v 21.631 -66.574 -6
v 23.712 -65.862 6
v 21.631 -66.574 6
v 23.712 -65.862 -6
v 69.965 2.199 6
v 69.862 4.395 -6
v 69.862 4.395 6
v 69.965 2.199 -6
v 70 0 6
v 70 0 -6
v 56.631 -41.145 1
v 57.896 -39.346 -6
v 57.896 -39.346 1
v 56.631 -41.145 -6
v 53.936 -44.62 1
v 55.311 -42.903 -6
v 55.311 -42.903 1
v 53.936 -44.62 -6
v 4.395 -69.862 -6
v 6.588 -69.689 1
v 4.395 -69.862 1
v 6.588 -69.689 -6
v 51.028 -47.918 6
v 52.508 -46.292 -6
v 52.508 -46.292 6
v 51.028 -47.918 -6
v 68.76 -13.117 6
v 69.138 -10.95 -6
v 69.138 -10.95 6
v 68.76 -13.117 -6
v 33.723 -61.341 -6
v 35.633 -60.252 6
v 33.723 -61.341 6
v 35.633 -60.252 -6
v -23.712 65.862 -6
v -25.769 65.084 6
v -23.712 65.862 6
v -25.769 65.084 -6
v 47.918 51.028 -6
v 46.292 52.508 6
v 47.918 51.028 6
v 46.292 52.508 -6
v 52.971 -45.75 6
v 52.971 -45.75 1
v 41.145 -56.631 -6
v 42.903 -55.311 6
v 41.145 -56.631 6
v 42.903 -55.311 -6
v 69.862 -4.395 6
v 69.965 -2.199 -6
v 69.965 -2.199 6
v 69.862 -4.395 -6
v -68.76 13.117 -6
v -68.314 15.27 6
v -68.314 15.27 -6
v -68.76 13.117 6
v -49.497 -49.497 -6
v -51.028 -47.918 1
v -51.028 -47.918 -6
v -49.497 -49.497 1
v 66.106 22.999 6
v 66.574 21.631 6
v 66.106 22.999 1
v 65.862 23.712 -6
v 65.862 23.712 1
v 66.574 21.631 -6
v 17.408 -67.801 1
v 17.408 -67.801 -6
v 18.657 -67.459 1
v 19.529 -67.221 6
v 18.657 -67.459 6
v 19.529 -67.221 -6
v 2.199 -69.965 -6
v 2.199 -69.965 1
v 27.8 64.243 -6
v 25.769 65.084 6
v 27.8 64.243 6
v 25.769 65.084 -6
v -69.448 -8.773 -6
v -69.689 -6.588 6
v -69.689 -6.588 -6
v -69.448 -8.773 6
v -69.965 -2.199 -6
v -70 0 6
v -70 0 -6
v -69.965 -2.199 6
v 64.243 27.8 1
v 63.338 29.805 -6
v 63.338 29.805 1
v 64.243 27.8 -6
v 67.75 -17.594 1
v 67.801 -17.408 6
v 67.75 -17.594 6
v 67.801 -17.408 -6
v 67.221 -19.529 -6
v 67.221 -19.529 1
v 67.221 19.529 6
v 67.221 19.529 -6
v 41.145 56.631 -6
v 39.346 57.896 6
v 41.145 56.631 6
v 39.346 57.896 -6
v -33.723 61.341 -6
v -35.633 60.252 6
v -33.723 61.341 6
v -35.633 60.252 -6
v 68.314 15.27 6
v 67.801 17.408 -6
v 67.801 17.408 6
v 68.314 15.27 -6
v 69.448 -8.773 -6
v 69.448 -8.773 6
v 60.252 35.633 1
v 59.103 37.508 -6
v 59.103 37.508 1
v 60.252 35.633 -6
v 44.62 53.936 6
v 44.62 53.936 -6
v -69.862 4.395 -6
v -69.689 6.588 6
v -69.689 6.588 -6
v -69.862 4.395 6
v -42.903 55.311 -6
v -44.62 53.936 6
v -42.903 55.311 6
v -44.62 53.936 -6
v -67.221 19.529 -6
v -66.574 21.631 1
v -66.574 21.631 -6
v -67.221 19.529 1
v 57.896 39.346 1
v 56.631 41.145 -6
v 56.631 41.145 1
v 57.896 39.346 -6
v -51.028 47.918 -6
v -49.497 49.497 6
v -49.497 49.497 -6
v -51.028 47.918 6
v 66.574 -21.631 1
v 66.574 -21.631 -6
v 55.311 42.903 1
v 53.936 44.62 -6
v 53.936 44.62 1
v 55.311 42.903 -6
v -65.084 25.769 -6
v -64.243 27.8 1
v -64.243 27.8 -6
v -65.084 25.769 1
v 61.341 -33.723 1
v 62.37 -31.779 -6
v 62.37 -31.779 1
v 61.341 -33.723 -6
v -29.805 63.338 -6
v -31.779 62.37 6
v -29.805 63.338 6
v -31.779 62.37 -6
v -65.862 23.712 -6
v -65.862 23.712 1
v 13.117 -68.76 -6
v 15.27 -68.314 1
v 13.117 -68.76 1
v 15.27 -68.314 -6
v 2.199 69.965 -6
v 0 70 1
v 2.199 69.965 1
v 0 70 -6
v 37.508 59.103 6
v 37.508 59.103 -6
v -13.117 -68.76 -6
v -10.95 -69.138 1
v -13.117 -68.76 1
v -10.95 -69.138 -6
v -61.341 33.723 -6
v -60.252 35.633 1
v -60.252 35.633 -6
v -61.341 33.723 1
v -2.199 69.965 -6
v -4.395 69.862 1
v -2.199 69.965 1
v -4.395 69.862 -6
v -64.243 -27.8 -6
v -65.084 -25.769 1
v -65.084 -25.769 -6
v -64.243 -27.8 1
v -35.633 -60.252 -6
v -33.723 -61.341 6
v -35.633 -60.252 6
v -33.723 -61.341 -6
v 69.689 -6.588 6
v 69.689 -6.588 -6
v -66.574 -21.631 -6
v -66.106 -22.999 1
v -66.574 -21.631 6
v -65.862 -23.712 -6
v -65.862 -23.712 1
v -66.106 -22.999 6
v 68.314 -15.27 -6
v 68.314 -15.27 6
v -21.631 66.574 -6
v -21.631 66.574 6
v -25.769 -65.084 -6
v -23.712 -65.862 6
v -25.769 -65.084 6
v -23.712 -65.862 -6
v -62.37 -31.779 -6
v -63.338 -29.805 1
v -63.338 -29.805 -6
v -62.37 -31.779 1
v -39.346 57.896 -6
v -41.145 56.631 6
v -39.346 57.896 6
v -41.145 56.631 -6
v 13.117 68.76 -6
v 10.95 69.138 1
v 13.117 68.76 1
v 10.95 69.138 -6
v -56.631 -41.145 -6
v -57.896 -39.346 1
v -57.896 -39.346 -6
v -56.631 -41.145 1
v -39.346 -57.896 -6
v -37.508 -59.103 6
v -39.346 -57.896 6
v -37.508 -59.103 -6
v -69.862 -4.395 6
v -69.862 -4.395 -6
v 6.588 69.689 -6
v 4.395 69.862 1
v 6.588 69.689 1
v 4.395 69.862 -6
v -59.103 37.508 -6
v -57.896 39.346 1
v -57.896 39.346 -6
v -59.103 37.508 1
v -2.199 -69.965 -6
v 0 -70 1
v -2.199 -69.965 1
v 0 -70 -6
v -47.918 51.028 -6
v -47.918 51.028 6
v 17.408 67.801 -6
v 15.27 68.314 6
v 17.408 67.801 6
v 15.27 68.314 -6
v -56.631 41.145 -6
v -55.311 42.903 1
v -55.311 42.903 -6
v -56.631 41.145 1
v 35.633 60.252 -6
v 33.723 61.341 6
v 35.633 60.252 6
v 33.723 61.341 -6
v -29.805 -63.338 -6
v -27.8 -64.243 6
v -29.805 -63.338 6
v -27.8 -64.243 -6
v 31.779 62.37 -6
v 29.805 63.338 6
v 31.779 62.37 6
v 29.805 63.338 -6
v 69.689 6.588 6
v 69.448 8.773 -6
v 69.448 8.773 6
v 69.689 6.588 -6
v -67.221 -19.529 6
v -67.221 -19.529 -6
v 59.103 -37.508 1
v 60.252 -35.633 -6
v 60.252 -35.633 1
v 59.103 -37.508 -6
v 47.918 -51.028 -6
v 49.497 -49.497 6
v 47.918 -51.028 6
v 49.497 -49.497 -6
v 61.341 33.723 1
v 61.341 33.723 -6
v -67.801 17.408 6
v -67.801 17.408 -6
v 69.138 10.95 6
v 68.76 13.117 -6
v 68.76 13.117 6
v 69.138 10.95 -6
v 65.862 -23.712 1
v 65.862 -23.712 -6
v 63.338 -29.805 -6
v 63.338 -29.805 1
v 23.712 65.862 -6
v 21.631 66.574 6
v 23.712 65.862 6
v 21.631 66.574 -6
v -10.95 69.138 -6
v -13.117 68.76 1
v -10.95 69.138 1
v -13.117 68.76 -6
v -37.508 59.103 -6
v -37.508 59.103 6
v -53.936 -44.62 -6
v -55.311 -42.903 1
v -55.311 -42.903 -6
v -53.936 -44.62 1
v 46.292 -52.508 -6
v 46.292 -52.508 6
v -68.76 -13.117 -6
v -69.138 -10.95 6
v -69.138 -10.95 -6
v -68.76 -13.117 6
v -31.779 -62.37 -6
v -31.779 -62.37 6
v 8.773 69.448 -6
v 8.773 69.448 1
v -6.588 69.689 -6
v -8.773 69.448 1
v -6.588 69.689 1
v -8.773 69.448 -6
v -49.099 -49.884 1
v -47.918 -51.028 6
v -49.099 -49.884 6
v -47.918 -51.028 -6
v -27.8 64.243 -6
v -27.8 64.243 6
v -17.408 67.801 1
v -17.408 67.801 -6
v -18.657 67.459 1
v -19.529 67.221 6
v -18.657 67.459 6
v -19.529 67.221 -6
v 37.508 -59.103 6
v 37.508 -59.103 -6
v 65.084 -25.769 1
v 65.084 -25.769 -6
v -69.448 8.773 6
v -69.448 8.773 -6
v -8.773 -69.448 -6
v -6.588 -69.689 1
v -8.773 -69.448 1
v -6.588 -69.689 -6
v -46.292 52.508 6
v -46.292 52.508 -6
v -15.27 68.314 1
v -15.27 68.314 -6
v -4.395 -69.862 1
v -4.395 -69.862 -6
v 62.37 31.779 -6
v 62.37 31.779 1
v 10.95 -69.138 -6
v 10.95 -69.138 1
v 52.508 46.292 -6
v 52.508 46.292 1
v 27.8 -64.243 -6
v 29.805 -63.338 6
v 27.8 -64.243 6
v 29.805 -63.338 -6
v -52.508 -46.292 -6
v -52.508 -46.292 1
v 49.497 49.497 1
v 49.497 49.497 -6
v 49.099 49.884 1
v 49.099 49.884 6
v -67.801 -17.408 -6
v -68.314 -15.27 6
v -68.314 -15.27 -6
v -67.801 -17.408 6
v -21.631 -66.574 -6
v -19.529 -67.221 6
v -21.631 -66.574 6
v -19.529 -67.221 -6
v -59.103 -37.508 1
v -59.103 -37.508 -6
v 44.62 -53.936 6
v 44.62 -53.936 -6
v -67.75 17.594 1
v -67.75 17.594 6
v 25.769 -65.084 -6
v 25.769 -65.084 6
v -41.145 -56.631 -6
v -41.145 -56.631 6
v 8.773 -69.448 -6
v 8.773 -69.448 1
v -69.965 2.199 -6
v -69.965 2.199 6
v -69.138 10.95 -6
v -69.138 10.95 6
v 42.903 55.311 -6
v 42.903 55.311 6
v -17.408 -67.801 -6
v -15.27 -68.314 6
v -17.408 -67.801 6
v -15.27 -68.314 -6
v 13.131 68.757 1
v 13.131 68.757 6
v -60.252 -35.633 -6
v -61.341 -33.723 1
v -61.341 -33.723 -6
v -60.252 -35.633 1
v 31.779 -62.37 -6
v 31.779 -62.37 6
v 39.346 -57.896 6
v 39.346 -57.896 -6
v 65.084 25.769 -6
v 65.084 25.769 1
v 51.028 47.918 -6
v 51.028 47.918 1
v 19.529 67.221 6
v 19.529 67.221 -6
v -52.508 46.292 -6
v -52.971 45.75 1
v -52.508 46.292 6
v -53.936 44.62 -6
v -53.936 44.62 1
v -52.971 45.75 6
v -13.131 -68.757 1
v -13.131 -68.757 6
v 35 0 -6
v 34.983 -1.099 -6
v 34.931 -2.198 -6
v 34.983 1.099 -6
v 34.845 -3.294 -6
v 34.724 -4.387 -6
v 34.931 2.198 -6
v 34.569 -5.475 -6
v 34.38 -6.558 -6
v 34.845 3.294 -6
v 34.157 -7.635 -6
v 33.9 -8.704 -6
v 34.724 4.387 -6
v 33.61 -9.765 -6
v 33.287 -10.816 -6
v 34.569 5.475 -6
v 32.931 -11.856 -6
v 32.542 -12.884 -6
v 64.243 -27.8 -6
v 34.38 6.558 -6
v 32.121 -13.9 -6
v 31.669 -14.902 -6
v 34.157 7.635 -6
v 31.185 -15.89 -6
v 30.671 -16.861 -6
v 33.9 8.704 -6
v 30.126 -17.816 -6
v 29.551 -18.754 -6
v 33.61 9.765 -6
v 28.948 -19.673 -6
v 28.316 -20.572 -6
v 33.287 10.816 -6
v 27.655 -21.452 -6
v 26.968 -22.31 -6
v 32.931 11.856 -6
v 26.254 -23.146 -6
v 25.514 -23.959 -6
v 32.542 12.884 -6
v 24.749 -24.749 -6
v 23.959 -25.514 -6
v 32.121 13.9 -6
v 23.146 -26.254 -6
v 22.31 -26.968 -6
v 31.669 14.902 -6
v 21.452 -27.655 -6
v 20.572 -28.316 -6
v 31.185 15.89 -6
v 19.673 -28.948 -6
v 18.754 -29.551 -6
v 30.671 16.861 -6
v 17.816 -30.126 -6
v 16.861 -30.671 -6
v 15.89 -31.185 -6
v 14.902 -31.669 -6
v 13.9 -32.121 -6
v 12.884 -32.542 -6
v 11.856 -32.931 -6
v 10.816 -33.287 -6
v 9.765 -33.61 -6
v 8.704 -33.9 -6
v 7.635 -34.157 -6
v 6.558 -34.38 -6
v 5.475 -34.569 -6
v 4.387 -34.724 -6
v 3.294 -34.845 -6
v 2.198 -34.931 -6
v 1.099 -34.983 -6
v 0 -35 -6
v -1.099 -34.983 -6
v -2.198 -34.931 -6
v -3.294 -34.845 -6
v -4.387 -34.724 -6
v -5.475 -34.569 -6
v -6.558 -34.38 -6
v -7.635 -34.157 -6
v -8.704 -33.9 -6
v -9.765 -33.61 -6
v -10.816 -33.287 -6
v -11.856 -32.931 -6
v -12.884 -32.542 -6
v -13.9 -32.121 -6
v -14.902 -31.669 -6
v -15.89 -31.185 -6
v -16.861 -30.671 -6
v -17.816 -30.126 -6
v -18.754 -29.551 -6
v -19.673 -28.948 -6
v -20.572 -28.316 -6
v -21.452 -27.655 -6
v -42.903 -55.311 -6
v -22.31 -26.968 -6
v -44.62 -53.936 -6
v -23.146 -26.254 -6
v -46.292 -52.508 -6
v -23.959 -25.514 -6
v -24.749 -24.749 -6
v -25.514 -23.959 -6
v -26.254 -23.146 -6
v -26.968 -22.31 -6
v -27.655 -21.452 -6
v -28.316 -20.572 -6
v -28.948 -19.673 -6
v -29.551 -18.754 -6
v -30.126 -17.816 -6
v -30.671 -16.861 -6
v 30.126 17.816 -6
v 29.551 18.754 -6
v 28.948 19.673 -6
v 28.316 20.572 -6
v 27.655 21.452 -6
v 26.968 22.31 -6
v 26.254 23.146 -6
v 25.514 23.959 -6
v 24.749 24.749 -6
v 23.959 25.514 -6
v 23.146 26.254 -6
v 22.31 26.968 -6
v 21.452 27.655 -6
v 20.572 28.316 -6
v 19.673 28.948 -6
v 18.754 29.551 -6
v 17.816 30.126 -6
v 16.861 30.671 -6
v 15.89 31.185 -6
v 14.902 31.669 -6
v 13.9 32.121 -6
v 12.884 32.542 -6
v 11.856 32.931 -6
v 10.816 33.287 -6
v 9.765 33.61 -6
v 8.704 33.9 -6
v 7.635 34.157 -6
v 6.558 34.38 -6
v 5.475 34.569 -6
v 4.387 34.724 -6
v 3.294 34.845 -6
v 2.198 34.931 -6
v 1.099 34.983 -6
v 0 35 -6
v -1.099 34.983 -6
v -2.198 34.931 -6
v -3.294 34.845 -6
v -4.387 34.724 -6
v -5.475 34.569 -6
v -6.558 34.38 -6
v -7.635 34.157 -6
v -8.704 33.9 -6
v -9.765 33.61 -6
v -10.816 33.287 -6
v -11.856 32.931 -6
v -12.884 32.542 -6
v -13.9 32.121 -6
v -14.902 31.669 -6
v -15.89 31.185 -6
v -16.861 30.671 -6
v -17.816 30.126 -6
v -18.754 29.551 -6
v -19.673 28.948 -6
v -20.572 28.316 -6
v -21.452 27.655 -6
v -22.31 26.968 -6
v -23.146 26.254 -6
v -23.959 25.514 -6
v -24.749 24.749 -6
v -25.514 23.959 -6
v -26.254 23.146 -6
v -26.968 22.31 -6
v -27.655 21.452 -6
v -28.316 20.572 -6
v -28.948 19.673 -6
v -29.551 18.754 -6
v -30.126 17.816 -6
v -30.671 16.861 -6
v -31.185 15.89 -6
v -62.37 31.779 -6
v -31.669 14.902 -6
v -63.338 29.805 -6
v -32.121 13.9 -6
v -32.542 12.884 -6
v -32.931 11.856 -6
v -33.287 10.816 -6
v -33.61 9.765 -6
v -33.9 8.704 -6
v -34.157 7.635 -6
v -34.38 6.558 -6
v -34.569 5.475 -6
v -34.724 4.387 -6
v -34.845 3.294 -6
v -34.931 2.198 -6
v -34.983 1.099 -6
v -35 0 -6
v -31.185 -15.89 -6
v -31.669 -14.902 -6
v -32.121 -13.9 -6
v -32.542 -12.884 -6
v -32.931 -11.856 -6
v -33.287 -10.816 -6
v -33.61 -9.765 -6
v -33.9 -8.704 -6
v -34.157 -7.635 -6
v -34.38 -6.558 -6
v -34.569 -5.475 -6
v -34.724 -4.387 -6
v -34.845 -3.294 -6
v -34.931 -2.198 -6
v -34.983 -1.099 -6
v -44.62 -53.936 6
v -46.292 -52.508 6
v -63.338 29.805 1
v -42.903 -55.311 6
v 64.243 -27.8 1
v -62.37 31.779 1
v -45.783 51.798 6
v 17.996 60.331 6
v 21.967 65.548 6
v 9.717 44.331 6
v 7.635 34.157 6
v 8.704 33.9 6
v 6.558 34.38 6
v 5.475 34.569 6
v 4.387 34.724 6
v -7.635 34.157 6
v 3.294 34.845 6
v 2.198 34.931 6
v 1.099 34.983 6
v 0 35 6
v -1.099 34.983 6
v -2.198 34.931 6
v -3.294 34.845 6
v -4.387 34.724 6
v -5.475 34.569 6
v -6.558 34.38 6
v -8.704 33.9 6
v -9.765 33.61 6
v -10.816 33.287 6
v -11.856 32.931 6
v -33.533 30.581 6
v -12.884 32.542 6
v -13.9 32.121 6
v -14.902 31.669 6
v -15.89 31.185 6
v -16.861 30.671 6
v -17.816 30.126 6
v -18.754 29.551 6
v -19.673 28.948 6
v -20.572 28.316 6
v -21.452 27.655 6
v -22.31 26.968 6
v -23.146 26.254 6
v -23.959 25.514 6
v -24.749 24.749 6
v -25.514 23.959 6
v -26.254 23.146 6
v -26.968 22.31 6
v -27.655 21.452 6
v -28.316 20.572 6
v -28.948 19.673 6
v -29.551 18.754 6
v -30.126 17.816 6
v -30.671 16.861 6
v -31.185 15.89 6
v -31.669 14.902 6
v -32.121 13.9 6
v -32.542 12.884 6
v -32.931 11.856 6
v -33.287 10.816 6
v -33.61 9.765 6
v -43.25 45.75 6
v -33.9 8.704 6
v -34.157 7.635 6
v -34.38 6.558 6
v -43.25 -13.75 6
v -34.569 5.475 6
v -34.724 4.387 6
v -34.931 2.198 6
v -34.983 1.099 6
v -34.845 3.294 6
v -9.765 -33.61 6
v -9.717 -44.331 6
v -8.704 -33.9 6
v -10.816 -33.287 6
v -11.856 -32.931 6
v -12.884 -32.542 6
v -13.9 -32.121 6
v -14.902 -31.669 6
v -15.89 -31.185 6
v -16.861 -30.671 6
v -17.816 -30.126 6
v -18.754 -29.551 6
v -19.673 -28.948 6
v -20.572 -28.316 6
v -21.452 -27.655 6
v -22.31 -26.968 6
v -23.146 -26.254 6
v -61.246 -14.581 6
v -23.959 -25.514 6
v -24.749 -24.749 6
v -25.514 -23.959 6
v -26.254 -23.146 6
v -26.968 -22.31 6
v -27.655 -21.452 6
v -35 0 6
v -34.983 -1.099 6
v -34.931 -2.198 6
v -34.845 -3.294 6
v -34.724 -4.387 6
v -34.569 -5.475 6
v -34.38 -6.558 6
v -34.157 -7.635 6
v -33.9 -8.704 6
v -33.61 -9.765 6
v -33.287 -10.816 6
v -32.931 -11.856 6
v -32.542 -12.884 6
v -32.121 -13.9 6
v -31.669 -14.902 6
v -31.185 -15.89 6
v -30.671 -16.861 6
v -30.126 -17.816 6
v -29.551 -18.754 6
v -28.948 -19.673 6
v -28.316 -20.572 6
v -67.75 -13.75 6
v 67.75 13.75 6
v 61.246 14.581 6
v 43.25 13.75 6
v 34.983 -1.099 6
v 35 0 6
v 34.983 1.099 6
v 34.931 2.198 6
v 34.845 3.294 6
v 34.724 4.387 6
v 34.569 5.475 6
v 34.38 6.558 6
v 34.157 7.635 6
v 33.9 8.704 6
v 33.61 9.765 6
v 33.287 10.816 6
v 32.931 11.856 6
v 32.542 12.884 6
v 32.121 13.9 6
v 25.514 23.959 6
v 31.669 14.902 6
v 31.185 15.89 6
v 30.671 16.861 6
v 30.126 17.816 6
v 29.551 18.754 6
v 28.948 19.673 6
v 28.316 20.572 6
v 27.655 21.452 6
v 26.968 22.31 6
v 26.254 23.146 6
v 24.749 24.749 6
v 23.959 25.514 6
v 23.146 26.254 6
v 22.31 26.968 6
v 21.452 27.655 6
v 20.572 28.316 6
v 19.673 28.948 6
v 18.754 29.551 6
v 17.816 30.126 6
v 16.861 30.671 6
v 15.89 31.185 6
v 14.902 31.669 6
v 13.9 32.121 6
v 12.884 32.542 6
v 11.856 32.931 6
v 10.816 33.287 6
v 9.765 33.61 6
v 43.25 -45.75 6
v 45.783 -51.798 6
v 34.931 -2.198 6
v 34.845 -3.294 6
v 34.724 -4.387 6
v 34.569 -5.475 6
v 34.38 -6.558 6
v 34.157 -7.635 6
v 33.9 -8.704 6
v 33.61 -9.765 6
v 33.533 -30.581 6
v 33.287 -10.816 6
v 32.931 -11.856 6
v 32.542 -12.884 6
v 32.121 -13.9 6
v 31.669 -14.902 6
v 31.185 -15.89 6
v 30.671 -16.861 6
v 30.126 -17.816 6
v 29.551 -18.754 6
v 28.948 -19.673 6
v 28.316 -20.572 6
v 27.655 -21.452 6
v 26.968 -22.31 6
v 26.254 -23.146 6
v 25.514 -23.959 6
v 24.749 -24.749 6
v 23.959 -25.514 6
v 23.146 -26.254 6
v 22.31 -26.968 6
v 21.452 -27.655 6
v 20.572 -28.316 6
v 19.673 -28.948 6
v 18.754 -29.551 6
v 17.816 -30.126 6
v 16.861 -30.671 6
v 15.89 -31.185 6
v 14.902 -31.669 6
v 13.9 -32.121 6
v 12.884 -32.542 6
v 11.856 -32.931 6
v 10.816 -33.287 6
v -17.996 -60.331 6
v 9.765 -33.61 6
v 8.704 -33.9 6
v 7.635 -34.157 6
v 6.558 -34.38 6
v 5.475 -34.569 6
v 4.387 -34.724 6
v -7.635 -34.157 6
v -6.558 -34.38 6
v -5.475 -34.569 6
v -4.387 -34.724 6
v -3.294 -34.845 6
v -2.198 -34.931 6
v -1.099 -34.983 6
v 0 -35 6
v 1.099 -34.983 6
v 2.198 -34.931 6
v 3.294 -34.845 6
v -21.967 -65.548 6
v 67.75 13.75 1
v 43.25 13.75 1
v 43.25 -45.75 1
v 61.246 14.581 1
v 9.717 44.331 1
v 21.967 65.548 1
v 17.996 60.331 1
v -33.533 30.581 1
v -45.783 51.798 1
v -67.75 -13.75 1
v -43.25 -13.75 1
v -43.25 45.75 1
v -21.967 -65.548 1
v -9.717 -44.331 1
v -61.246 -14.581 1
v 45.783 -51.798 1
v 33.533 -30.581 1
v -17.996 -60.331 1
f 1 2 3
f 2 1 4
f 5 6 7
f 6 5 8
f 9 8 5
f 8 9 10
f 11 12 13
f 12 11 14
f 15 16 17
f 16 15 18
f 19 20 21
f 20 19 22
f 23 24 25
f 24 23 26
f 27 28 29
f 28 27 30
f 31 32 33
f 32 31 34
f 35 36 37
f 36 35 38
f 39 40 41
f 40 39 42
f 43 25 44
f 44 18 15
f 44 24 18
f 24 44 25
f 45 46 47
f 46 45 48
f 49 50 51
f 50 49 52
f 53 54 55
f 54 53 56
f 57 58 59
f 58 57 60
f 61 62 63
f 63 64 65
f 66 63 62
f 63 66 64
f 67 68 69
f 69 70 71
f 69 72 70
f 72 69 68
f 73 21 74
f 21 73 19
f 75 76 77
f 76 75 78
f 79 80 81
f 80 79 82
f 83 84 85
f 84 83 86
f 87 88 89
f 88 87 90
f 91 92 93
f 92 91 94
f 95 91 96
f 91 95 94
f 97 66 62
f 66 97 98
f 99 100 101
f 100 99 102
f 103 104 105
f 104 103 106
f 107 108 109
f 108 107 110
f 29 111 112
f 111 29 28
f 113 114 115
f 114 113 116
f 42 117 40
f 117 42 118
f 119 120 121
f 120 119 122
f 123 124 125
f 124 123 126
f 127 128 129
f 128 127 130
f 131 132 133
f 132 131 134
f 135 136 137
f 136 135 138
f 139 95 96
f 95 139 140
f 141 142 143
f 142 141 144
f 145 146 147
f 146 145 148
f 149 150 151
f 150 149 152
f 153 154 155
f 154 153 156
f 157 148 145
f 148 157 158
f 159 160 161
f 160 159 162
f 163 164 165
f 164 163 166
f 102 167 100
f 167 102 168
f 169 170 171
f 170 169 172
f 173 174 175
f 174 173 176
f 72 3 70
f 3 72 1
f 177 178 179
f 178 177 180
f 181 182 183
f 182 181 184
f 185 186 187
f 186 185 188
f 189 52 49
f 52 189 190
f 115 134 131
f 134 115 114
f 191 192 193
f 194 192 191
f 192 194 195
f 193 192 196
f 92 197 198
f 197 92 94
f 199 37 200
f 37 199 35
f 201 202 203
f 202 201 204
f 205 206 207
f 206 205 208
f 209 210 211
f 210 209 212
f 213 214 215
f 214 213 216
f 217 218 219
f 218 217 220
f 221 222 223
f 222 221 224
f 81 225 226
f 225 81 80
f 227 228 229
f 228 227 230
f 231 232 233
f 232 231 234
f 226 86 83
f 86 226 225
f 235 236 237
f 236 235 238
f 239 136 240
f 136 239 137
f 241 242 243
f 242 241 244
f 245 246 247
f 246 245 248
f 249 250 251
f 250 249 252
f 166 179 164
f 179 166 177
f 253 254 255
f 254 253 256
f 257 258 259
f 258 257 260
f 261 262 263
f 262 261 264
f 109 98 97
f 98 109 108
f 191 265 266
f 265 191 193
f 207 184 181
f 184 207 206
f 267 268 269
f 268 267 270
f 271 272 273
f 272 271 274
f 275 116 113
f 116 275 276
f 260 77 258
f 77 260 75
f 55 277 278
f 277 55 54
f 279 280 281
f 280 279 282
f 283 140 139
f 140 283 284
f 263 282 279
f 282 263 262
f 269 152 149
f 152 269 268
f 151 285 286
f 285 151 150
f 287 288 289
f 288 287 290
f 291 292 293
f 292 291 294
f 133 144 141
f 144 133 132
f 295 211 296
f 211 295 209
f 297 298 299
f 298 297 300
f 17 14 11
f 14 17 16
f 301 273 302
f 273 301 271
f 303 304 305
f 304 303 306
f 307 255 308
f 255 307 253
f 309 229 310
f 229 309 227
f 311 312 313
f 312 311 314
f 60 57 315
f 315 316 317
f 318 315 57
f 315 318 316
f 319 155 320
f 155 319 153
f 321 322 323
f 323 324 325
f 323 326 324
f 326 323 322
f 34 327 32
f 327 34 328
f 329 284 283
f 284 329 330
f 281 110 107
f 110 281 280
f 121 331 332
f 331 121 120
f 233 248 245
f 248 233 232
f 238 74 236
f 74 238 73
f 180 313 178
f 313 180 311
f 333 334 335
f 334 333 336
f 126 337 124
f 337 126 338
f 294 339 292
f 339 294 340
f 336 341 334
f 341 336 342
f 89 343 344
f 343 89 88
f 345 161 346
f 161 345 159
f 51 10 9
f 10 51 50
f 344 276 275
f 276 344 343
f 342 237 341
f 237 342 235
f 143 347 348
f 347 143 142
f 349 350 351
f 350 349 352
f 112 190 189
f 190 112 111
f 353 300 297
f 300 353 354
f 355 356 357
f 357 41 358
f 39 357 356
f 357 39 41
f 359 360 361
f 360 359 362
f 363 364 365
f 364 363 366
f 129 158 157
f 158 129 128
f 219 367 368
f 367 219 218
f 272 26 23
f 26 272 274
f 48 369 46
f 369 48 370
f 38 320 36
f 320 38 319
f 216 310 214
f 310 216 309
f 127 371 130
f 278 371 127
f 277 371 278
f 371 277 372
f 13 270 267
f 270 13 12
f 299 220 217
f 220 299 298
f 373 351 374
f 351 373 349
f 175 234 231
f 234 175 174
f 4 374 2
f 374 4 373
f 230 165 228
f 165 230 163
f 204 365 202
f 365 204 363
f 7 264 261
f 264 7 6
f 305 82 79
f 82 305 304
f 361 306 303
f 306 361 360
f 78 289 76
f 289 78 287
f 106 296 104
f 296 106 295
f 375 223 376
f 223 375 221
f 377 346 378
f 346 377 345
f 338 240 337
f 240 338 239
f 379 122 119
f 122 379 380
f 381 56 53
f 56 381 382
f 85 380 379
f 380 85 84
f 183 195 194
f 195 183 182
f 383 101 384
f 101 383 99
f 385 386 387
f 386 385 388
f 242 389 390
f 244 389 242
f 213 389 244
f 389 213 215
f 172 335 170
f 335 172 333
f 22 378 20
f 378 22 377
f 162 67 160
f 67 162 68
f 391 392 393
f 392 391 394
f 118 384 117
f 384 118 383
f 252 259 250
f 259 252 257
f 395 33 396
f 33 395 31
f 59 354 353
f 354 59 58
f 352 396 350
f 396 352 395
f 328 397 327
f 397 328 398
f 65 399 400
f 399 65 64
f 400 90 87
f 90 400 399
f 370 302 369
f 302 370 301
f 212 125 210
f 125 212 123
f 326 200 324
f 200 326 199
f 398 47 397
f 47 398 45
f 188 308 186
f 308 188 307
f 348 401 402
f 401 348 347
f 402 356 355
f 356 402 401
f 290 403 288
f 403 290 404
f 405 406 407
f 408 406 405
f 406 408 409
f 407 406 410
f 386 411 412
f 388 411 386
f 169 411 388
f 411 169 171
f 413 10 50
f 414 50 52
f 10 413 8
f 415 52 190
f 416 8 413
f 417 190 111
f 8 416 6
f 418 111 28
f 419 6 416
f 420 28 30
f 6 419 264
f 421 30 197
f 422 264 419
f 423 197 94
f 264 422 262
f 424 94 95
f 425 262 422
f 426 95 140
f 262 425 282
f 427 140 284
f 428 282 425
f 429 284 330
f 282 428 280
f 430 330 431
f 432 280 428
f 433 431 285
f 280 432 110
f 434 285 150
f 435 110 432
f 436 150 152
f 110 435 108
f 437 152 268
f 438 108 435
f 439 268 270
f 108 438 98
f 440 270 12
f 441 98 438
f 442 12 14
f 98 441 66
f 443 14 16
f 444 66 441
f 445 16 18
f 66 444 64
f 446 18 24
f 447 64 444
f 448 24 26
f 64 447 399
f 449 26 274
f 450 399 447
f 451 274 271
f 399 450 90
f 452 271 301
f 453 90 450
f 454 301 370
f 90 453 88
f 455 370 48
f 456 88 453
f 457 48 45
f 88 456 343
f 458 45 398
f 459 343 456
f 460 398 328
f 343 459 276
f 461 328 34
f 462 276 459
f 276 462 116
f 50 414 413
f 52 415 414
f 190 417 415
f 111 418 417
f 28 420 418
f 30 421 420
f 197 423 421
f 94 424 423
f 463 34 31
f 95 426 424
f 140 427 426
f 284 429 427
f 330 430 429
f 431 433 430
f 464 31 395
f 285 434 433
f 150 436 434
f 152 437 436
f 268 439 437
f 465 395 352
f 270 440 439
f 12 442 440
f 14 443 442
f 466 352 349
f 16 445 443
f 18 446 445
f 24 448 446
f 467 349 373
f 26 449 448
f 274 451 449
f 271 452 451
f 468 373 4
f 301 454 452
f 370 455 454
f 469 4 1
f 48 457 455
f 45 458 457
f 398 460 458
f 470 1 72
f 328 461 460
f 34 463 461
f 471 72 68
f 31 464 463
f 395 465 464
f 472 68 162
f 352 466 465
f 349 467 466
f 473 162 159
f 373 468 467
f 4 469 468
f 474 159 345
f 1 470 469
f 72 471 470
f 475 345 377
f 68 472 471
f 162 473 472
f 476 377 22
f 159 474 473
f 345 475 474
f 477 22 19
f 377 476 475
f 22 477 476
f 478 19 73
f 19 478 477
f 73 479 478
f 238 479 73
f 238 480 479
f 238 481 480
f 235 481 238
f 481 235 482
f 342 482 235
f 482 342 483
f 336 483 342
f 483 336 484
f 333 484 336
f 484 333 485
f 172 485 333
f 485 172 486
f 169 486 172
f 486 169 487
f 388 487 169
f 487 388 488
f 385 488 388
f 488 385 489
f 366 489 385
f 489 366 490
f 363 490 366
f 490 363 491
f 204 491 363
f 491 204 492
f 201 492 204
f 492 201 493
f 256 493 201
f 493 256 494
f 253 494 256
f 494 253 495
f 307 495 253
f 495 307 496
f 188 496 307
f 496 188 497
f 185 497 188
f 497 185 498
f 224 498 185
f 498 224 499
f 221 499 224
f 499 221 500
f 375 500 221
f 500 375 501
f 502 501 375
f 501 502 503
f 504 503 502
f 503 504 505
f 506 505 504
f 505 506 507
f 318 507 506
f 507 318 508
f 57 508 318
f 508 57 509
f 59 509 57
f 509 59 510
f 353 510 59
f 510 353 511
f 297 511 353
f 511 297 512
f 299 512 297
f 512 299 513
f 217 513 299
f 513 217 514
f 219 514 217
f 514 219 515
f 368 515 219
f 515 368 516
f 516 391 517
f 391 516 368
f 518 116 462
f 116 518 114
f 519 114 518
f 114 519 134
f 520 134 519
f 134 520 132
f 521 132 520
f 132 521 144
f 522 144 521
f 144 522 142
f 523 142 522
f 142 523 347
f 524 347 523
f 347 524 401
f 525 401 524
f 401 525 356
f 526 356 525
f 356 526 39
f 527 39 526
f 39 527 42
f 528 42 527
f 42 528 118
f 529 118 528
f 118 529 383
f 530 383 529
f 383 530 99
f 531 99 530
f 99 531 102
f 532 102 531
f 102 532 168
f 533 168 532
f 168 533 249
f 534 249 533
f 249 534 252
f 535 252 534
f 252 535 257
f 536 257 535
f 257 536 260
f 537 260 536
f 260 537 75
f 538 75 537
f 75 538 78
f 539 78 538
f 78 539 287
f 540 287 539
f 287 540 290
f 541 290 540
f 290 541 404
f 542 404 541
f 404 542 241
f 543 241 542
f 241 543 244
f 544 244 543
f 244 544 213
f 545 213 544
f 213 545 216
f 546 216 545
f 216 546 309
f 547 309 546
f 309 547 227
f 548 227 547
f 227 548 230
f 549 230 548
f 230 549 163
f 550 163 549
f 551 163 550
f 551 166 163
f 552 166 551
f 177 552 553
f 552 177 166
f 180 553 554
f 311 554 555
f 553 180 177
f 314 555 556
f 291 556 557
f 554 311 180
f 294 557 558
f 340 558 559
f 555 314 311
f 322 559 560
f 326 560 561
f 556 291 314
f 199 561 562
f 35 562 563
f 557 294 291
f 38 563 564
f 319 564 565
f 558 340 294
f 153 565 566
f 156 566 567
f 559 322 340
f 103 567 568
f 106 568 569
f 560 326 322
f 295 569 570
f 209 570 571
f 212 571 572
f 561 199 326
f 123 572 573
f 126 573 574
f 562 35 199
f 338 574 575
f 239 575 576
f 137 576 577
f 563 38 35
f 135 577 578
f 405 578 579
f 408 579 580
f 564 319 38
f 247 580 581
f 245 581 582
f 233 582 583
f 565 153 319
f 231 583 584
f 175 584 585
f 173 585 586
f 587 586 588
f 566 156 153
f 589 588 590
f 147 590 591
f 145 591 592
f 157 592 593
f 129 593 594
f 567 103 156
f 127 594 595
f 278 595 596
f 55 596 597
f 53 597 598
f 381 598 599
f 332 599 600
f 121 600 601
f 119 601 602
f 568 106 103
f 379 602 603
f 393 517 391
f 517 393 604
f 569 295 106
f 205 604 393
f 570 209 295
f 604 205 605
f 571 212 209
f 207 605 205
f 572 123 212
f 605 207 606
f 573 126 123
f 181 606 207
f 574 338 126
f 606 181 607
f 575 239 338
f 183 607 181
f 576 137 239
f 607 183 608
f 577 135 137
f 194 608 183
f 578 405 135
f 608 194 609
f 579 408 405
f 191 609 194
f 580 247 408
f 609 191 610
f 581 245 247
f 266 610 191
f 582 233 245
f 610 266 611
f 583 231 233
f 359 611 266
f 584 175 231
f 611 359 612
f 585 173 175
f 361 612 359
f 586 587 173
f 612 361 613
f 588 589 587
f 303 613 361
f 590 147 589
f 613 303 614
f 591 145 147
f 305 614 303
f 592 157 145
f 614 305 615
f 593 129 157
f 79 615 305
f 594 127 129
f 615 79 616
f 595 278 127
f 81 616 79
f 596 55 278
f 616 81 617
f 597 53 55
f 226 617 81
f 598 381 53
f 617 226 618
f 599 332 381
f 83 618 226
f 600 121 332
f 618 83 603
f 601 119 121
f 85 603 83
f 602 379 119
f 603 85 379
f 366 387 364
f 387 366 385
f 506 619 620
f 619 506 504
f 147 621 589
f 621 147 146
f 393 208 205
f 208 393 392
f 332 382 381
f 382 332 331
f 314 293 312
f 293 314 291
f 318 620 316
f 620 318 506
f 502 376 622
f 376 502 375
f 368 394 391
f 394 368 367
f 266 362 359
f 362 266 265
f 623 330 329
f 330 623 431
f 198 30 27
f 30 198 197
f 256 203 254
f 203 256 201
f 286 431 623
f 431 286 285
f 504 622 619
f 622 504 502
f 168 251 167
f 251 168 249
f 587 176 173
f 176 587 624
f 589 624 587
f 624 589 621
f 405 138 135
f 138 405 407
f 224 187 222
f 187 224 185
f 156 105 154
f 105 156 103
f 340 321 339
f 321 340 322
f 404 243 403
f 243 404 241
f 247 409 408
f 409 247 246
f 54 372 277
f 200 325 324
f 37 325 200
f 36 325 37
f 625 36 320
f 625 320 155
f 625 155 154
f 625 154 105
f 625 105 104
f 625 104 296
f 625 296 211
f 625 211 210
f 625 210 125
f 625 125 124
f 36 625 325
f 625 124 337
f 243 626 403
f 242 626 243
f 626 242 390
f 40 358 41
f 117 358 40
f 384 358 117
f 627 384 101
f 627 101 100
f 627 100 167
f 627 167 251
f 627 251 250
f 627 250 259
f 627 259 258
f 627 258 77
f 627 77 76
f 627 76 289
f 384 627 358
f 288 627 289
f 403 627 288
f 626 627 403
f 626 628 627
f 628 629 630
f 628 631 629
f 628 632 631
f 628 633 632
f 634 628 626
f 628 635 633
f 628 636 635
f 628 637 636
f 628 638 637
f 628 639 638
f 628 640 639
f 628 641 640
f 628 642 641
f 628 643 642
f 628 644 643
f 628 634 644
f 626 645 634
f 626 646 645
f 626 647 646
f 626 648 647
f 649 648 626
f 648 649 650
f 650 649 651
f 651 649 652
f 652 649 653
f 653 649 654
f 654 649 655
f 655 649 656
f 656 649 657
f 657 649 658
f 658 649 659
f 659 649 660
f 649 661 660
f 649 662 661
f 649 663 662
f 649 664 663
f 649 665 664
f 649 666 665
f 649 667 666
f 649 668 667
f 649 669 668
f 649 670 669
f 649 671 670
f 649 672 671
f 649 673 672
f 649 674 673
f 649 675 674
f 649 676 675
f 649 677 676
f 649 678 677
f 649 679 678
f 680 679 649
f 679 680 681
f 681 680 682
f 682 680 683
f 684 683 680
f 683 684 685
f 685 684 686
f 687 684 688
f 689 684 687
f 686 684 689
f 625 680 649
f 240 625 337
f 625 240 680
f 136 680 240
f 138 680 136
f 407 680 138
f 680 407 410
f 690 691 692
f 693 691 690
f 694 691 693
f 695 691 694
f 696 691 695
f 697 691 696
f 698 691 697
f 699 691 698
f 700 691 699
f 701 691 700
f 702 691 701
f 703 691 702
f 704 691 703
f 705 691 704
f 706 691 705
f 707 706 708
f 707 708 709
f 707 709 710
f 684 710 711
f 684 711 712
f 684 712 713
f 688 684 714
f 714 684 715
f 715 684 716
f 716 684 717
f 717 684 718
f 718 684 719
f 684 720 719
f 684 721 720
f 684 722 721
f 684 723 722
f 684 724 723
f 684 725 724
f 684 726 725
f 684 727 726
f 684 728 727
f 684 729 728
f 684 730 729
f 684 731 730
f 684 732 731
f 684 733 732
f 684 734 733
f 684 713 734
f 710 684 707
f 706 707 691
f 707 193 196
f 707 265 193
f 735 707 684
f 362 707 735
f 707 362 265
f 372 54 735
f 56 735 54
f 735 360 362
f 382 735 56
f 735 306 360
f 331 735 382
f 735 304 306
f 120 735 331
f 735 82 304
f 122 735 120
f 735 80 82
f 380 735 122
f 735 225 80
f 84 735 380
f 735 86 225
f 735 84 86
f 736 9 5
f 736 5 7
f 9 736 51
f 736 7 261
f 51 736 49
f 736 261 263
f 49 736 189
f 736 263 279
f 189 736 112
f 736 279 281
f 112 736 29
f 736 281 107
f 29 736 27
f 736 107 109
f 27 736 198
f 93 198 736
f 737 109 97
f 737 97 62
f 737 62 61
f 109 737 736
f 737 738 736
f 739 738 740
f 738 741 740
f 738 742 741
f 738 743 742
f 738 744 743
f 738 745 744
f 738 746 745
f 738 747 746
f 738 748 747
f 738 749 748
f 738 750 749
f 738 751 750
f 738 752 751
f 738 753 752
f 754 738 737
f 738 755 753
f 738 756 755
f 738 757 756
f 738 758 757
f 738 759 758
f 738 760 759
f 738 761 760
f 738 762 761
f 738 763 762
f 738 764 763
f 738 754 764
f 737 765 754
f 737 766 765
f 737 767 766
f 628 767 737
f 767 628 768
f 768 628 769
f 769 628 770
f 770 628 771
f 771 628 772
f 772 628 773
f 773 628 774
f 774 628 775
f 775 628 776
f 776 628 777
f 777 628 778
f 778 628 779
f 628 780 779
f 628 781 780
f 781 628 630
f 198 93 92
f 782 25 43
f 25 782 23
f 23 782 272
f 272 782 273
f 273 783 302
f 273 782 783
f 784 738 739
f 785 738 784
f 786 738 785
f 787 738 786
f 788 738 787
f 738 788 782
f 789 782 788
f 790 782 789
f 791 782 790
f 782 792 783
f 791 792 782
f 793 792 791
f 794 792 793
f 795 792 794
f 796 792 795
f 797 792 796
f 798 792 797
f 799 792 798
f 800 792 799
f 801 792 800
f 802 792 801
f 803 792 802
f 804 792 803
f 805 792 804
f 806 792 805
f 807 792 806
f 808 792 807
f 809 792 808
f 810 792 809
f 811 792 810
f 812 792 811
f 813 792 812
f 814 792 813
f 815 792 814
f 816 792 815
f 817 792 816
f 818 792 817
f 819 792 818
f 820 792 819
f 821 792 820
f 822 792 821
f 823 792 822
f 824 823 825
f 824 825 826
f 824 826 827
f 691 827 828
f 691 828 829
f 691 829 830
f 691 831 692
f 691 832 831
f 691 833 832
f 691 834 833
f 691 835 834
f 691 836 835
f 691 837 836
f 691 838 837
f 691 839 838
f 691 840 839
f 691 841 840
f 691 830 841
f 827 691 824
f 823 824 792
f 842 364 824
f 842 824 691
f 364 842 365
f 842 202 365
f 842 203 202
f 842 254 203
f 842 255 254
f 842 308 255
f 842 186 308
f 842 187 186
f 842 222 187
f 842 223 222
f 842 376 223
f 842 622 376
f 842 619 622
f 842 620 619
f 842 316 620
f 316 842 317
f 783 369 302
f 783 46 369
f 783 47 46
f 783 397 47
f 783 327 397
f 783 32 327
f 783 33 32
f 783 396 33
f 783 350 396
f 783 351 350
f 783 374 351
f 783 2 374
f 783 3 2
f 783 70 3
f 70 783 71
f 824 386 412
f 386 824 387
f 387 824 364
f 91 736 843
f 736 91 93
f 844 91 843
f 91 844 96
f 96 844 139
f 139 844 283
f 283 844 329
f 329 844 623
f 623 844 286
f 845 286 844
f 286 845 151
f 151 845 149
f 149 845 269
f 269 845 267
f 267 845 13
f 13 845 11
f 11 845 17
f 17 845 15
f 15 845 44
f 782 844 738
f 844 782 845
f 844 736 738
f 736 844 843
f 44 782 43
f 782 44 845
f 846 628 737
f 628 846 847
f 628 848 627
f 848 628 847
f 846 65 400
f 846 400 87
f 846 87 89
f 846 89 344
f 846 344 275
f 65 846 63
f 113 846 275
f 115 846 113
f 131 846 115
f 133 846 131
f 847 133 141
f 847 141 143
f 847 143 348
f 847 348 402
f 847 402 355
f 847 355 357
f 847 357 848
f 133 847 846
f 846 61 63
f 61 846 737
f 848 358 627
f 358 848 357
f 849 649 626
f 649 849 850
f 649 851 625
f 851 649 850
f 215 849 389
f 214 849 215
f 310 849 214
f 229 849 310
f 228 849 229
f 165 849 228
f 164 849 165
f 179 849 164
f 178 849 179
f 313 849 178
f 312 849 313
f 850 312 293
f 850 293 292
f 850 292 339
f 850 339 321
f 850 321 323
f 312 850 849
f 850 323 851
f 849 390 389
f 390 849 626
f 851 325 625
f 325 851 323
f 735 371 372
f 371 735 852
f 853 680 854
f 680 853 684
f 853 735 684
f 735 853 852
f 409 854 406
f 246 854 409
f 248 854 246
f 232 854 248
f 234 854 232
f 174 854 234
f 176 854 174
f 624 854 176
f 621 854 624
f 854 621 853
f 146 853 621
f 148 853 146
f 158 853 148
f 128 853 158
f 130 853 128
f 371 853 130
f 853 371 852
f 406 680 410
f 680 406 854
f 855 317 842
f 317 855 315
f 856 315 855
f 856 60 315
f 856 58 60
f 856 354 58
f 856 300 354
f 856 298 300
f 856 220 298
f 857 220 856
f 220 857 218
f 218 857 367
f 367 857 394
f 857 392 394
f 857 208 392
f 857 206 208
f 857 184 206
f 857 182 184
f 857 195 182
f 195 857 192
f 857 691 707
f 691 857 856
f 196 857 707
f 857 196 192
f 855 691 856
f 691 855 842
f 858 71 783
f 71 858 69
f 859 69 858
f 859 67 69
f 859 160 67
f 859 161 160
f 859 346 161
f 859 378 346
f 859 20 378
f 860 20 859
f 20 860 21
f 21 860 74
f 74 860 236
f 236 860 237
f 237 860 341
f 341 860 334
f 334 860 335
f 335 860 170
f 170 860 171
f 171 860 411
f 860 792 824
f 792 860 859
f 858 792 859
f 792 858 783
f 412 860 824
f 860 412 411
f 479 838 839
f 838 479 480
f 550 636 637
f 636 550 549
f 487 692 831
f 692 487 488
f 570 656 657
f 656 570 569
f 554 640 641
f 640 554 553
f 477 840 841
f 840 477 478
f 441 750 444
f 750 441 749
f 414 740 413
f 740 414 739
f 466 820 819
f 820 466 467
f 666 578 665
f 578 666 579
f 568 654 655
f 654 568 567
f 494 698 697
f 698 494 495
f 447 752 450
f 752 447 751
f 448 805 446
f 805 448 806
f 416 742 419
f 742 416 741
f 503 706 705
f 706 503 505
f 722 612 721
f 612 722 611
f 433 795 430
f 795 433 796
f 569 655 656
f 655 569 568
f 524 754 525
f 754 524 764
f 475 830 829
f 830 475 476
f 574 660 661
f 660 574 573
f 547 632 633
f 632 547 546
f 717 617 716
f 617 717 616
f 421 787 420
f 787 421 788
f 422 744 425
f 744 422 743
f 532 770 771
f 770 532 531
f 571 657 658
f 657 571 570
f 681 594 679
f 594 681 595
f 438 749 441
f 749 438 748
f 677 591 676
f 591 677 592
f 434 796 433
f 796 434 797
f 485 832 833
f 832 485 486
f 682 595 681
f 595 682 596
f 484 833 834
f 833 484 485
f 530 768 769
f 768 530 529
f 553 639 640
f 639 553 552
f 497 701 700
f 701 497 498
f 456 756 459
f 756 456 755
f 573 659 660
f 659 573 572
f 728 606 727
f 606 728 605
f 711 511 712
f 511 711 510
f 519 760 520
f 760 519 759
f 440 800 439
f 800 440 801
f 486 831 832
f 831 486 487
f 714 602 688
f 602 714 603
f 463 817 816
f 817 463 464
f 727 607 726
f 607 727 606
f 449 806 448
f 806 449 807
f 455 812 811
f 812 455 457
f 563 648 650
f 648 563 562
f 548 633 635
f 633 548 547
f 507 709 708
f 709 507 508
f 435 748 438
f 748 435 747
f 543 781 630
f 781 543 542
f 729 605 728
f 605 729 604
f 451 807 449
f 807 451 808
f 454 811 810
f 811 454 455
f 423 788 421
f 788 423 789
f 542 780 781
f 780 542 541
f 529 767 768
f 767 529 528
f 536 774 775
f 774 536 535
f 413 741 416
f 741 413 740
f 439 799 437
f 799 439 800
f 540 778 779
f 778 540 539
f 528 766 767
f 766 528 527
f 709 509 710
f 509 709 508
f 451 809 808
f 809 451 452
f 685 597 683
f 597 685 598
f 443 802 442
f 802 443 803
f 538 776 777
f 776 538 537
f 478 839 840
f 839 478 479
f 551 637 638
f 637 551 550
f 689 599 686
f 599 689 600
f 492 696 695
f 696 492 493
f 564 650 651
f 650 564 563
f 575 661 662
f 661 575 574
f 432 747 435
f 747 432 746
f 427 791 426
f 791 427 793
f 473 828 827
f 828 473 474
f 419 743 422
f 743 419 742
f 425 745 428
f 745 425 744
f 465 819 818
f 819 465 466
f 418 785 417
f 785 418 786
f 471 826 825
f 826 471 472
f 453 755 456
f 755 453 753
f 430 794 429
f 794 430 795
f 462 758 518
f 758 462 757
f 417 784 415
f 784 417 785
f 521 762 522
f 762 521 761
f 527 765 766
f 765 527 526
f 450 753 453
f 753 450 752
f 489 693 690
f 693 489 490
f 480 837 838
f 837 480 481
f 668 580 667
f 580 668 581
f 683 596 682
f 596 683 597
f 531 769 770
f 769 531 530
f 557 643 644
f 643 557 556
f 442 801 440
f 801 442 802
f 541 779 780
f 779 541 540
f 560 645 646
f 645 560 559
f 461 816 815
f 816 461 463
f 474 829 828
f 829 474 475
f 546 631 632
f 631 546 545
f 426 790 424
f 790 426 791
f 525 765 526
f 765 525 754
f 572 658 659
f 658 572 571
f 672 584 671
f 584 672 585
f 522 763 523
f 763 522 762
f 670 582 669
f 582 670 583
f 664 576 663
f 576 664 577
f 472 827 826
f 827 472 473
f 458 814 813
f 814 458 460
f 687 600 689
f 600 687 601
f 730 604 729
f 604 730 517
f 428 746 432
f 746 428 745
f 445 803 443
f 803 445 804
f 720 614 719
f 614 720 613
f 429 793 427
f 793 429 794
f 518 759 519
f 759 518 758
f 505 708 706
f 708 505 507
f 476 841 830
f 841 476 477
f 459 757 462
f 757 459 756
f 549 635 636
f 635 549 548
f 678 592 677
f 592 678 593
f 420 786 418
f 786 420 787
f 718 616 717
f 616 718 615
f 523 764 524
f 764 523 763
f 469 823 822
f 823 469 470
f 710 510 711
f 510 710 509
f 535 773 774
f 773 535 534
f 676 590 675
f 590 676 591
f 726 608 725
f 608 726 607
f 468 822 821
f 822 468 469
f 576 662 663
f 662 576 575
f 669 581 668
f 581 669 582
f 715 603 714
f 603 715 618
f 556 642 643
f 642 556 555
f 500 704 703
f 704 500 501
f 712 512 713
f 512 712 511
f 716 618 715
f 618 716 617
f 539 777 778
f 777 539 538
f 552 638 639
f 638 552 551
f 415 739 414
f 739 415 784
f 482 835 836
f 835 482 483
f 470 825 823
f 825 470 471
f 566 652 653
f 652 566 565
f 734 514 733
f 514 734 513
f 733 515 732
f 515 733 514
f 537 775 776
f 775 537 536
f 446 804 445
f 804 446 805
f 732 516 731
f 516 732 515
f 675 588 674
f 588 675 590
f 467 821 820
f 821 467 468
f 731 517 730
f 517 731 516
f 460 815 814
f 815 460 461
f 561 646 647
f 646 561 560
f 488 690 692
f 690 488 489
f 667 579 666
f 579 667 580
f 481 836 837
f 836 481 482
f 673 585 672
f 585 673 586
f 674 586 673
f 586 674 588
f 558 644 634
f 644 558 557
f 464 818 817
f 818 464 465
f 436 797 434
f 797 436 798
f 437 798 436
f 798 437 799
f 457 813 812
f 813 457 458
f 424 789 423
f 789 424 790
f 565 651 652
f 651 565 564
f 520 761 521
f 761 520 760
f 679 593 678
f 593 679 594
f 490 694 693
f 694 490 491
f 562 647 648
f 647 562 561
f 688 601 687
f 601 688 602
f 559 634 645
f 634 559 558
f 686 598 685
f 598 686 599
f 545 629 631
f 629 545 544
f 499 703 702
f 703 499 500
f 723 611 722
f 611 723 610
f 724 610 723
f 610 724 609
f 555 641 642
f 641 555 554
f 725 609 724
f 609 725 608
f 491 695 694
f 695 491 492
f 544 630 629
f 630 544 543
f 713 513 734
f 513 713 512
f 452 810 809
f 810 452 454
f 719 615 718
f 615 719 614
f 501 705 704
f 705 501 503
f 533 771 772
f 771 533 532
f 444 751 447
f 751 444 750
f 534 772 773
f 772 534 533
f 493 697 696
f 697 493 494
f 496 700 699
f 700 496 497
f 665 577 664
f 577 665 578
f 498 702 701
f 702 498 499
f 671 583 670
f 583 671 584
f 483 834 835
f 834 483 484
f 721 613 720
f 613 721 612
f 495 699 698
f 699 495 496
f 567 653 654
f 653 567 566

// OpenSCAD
$fn=200;


difference(){

difference(){


cylinder(h = 12, r = 70, center = true);

translate([55.5, -16, 4])
cube(size = [24.5,59.5,6], center = true);

rotate([0,0,60])
translate([55.5, -16, 4])
cube(size = [24.5,59.5,6], center = true);

rotate([0,0,120])
translate([55.5, -16, 4])
cube(size = [24.5,59.5,6], center = true);

rotate([0,0,180])
translate([55.5, -16, 4])
cube(size = [24.5,59.5,6], center = true);

rotate([0,0,240])
translate([55.5, -16, 4])
cube(size = [24.5,59.5,6], center = true);

rotate([0,0,300])
translate([55.5, -16, 4])
cube(size = [24.5,59.5,6], center = true);


}


translate([0, 0, 13.5])
cylinder(h = 40, r = 35, center = true);


}
